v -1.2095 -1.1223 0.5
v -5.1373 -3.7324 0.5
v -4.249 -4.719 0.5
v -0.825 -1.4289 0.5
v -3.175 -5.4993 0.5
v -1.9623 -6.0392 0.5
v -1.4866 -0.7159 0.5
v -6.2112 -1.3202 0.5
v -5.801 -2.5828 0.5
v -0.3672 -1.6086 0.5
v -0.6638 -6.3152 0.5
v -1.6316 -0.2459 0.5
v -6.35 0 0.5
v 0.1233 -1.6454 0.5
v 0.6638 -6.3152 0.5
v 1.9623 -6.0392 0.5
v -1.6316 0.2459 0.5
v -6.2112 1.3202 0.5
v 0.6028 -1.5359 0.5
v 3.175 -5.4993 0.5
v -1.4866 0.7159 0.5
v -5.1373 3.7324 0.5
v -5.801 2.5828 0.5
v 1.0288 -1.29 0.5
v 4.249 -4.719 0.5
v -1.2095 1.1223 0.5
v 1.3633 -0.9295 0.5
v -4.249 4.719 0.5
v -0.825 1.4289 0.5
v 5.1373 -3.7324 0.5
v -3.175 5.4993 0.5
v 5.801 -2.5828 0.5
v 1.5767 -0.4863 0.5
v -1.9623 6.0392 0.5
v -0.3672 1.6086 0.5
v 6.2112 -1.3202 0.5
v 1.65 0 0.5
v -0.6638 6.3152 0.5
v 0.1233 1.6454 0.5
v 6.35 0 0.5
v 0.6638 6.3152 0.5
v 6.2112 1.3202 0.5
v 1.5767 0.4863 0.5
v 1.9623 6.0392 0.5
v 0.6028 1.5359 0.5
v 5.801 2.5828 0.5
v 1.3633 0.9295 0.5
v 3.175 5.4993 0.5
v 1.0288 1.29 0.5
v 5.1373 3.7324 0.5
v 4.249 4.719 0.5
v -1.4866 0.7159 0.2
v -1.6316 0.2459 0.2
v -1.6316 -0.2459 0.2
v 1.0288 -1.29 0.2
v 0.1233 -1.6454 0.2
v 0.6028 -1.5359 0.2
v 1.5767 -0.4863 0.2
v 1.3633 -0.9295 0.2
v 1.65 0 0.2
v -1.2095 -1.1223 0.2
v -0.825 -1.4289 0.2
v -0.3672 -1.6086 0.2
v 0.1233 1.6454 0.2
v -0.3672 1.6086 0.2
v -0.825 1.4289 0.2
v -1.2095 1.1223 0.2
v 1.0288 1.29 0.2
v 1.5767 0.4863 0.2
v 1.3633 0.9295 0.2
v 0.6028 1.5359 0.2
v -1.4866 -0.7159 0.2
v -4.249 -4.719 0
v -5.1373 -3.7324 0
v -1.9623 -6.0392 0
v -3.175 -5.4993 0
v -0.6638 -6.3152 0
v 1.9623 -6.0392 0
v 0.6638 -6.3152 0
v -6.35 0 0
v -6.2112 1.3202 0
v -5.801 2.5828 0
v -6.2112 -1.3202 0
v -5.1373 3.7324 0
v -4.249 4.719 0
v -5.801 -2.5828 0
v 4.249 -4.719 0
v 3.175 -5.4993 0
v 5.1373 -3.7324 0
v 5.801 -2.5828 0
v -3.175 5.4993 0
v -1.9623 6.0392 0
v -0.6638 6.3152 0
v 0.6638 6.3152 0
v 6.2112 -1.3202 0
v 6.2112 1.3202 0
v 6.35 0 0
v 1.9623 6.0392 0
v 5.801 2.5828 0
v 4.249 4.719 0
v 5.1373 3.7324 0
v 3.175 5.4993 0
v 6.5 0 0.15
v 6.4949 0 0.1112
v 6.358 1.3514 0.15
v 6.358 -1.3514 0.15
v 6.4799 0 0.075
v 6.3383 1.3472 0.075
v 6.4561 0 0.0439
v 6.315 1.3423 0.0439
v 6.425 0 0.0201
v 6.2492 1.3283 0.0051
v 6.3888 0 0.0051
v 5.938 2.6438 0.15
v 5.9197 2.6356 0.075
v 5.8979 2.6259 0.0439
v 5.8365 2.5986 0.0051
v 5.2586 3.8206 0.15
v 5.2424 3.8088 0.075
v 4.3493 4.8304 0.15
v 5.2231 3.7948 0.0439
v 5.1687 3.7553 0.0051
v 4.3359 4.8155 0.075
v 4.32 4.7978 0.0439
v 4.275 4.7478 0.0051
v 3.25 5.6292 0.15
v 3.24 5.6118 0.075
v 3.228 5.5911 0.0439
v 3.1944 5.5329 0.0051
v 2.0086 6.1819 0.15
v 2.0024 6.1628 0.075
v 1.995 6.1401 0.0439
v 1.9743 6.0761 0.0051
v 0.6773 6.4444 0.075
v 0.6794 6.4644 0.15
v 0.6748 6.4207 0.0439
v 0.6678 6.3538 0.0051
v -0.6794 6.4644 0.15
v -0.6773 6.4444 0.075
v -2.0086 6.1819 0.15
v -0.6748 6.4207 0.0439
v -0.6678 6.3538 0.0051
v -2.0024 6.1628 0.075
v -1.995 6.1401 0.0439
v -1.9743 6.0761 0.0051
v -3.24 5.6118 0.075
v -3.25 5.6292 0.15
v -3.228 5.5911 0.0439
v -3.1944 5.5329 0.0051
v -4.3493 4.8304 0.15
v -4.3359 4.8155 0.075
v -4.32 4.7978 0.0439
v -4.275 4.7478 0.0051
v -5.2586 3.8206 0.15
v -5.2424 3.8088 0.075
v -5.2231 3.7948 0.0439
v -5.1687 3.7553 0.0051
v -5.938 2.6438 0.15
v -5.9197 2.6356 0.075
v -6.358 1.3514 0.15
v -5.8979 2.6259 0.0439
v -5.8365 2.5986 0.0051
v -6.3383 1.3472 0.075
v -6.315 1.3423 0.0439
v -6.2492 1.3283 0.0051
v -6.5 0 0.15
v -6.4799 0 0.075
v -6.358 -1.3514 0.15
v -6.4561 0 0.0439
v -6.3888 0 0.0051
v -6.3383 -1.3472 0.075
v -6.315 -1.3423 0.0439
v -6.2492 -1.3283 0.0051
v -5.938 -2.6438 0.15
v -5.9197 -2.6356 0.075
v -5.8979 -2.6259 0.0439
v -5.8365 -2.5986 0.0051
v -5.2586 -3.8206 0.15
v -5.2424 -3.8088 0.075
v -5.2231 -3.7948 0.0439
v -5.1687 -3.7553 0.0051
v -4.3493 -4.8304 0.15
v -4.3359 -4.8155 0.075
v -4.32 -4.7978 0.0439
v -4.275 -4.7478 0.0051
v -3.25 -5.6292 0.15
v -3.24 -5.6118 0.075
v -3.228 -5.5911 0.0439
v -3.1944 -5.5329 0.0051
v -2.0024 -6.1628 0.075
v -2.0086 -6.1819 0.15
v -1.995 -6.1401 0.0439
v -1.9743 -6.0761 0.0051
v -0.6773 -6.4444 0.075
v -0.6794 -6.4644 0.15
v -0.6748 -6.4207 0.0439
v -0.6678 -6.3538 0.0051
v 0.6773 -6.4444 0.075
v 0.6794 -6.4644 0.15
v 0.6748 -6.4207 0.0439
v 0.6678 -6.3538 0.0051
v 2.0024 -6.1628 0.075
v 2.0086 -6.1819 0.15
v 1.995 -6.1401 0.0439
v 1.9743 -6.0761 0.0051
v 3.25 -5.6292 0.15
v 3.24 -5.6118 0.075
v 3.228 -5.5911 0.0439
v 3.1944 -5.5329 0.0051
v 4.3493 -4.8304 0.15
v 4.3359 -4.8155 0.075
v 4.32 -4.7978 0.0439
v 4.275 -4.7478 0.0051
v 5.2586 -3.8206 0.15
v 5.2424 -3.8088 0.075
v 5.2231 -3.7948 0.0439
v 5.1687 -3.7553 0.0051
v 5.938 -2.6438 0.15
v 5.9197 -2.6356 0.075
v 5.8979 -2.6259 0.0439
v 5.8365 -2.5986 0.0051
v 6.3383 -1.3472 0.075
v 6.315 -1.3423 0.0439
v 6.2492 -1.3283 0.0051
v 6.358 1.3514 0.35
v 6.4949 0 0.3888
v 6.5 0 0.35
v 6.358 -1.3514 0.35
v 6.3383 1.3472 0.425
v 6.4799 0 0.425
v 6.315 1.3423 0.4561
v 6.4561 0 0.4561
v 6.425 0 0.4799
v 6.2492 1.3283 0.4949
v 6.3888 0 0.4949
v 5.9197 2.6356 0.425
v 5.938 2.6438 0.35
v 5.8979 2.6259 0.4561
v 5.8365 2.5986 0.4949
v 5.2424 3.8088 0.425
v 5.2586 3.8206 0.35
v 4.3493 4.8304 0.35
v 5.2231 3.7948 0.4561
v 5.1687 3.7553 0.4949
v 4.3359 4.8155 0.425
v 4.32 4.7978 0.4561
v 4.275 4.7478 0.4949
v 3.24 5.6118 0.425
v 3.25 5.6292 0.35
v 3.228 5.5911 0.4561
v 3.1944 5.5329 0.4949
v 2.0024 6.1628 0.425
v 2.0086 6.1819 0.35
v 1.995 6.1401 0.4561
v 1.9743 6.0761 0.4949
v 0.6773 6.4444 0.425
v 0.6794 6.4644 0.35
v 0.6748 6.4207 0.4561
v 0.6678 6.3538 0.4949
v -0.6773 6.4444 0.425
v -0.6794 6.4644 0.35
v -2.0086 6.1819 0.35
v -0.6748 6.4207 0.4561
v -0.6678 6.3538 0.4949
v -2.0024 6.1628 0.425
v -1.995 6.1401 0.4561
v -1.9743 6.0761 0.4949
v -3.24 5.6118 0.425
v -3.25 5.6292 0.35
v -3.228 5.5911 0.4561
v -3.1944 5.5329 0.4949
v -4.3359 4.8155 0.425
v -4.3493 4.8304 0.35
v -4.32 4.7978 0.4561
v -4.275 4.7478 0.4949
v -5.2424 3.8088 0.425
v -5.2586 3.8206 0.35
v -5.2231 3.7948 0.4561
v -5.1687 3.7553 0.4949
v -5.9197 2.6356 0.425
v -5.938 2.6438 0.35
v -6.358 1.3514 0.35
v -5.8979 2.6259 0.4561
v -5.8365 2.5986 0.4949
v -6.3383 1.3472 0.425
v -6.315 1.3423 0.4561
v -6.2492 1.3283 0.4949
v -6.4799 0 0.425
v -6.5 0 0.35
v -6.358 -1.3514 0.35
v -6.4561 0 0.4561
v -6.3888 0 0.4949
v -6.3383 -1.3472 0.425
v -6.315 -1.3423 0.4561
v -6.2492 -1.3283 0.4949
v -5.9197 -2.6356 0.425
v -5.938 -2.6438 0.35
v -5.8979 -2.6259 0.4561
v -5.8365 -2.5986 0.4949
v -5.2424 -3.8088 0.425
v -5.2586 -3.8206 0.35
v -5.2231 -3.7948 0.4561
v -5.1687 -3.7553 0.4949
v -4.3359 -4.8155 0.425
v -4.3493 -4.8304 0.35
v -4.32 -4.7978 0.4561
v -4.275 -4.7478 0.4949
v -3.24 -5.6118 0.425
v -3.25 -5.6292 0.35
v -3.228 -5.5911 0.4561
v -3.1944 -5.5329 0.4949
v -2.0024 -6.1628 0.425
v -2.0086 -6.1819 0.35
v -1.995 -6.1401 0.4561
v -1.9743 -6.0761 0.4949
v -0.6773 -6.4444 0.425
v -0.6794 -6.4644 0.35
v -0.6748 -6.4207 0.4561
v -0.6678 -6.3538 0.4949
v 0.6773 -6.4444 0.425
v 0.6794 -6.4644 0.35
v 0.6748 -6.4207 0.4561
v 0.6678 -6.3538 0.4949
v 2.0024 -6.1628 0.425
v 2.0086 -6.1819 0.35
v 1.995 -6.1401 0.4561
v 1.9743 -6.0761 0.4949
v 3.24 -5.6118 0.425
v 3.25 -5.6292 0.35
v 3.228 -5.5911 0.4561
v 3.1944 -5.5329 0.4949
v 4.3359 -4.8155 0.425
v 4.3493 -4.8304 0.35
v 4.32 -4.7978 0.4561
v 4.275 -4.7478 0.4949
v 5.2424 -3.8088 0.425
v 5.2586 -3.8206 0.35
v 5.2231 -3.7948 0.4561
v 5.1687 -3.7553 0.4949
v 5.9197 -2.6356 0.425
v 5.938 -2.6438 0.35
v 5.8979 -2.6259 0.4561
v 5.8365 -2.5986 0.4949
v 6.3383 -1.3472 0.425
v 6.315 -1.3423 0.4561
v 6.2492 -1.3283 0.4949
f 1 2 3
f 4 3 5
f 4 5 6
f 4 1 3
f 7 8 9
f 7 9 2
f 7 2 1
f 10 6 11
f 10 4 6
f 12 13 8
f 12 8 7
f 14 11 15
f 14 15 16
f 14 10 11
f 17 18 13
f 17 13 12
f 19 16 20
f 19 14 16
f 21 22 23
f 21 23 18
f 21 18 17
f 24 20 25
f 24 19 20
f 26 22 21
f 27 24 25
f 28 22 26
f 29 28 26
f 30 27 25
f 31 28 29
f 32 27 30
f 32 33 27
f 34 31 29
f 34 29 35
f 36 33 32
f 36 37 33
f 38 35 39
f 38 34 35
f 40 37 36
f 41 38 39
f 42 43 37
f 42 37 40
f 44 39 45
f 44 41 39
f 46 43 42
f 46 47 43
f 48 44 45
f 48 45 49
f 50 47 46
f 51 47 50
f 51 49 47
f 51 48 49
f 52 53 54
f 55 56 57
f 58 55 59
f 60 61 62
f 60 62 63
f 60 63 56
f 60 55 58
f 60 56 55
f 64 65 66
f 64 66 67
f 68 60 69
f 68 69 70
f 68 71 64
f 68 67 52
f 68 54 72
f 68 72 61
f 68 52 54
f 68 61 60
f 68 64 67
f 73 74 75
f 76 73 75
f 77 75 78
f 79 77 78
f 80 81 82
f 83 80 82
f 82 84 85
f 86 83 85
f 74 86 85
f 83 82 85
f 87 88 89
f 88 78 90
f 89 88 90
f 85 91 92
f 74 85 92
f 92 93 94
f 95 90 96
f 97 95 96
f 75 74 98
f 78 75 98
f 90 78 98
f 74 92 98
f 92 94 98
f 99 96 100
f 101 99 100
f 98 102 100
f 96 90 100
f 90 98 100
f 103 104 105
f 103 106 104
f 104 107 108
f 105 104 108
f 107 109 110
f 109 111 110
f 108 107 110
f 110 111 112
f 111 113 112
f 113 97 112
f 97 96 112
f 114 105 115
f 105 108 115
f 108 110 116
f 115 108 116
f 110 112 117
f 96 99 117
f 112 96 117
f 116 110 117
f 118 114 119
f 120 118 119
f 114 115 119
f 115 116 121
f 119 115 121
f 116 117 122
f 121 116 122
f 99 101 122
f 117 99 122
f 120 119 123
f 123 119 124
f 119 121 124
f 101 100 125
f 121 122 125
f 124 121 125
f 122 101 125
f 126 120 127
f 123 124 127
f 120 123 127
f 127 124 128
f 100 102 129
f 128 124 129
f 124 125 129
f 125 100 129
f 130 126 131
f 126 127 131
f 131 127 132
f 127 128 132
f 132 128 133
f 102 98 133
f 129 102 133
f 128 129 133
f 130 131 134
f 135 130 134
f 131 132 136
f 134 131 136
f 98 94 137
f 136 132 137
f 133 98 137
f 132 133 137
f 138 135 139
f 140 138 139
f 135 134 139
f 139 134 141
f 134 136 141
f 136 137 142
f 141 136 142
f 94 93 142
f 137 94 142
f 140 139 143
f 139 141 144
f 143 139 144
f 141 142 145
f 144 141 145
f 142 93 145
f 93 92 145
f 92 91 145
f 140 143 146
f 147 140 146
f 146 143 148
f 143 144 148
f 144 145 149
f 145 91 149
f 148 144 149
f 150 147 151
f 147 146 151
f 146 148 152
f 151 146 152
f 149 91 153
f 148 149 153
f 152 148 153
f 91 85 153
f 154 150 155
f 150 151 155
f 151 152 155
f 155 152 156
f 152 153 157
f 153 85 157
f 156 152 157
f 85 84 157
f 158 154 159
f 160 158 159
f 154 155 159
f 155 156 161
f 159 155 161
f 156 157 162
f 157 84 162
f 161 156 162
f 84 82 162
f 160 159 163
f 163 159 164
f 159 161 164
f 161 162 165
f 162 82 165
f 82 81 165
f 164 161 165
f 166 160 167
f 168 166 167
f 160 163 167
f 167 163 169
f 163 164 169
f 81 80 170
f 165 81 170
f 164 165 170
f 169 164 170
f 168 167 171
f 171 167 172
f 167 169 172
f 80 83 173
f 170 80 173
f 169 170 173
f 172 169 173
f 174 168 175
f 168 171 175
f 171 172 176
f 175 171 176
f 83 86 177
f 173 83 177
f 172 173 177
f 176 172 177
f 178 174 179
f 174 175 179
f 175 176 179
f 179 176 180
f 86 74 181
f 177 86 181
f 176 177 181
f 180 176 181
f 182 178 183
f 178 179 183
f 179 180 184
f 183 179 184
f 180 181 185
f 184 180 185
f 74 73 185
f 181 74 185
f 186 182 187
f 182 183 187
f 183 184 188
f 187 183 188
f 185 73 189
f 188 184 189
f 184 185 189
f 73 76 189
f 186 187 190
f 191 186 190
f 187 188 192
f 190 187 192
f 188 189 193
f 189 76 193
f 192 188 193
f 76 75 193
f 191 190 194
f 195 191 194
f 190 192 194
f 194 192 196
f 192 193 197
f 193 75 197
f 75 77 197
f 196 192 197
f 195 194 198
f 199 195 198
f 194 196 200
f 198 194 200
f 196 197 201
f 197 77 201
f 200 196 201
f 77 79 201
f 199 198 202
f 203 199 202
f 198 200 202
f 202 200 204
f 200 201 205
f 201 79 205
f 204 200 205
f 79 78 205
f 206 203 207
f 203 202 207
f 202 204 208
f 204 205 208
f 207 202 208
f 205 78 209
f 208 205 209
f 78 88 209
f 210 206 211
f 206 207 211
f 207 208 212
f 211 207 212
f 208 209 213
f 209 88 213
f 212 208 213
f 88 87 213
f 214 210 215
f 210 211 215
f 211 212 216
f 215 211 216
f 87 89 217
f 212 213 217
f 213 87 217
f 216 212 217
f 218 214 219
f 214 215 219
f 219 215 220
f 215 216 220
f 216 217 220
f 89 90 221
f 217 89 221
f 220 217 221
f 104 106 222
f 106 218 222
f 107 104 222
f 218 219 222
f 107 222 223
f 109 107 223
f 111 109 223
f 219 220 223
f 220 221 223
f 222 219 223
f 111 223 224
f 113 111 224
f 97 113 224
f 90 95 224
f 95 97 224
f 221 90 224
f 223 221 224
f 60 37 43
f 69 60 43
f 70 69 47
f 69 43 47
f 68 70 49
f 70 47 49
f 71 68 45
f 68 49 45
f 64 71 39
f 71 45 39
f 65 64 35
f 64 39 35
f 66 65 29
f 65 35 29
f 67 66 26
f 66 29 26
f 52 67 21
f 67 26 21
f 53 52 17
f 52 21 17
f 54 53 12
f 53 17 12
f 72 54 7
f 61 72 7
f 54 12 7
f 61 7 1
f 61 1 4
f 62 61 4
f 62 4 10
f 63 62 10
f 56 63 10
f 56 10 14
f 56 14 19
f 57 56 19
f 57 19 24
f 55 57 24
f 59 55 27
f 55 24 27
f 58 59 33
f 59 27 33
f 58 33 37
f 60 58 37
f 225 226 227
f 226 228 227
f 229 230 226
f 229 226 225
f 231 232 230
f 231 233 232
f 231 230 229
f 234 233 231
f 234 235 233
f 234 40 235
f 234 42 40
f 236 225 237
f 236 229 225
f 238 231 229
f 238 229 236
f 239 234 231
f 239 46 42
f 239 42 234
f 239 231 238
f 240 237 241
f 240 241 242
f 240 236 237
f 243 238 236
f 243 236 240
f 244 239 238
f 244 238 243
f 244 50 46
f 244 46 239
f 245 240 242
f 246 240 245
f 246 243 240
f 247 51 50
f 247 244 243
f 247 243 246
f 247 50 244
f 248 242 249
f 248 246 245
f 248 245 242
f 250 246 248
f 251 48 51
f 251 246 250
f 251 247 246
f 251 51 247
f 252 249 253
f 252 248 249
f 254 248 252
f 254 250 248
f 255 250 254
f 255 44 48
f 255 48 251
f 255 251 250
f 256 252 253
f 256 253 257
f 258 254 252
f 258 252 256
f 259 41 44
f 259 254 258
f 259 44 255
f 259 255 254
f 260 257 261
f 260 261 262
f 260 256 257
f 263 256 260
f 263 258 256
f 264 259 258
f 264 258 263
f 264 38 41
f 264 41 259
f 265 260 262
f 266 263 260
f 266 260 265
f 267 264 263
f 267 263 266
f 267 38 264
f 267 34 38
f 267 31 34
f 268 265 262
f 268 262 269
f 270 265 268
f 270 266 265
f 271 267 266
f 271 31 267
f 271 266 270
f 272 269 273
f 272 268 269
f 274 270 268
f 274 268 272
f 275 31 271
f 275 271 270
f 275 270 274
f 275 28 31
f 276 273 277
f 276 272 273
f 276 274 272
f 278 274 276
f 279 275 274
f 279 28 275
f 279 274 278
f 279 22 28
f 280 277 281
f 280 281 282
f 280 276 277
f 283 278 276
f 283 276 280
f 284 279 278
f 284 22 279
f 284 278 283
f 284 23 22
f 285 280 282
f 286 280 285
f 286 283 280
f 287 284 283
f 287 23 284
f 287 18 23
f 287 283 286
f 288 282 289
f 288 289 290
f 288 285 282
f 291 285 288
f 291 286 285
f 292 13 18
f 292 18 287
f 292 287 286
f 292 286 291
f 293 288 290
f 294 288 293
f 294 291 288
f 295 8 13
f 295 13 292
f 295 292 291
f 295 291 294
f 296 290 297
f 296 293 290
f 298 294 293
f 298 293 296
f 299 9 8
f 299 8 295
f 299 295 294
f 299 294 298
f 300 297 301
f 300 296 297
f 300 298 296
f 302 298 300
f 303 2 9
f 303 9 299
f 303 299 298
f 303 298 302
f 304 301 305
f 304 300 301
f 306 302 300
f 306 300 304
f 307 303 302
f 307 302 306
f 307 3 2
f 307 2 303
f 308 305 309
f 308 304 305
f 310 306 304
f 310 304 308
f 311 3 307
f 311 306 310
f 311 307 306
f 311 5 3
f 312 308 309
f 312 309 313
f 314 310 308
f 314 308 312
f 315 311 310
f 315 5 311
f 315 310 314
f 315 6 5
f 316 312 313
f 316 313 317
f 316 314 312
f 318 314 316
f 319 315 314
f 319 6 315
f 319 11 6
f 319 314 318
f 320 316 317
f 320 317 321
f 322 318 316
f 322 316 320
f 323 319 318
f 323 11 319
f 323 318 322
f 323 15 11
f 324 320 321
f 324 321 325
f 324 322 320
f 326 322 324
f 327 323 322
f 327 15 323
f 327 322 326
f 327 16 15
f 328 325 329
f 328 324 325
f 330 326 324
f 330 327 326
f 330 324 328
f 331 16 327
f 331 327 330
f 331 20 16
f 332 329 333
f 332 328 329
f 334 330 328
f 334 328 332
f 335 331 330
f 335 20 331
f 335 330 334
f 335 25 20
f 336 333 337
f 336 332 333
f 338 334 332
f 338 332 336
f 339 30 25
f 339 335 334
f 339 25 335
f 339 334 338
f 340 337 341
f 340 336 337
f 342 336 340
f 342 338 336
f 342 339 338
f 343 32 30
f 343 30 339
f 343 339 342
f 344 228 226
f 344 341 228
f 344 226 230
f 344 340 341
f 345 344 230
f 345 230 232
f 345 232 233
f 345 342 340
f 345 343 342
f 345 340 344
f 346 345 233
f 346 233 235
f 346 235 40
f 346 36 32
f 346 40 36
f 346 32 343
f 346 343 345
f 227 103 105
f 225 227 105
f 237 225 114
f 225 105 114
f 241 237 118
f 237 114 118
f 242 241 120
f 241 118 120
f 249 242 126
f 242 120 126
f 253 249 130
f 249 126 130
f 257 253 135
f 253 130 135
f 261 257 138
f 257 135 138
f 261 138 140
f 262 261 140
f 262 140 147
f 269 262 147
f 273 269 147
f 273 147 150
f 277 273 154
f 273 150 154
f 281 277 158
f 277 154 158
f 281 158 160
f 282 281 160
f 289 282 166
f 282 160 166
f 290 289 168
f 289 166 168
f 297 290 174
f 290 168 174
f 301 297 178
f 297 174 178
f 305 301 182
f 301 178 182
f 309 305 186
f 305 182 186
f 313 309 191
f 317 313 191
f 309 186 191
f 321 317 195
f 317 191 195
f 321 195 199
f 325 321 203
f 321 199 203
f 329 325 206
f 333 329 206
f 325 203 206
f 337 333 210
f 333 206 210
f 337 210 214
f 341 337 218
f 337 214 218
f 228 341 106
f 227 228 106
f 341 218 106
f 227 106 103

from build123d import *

# Parameters (mm, degrees)
F0_R     = 6.5
F1_DEPTH = 0.5
F2_R     = 0.15
F3_R     = 1.65
F4_DEPTH = 0.3


# Not quite as in the source:
# - a feature names something its author has since deleted; it is built from what else it names


with BuildPart() as f1:
    # F0 (on Top) → F1 (new body)
    with BuildSketch(Plane.XY):
        Circle(F0_R)
    extrude(amount=F1_DEPTH)

    # F2
    f2_edges = [f1.edges().sort_by_distance(p)[0] for p in [
        (-6.5, 0, 0.5),
        (-6.5, 0, 0),
    ]]
    fillet(f2_edges, radius=F2_R)

    # F3 (on face) → F4 (cut)
    with BuildSketch(Plane.XY.offset(0.5)):
        Circle(F3_R)
    extrude(amount=-F4_DEPTH, mode=Mode.SUBTRACT)


solid = f1.part
